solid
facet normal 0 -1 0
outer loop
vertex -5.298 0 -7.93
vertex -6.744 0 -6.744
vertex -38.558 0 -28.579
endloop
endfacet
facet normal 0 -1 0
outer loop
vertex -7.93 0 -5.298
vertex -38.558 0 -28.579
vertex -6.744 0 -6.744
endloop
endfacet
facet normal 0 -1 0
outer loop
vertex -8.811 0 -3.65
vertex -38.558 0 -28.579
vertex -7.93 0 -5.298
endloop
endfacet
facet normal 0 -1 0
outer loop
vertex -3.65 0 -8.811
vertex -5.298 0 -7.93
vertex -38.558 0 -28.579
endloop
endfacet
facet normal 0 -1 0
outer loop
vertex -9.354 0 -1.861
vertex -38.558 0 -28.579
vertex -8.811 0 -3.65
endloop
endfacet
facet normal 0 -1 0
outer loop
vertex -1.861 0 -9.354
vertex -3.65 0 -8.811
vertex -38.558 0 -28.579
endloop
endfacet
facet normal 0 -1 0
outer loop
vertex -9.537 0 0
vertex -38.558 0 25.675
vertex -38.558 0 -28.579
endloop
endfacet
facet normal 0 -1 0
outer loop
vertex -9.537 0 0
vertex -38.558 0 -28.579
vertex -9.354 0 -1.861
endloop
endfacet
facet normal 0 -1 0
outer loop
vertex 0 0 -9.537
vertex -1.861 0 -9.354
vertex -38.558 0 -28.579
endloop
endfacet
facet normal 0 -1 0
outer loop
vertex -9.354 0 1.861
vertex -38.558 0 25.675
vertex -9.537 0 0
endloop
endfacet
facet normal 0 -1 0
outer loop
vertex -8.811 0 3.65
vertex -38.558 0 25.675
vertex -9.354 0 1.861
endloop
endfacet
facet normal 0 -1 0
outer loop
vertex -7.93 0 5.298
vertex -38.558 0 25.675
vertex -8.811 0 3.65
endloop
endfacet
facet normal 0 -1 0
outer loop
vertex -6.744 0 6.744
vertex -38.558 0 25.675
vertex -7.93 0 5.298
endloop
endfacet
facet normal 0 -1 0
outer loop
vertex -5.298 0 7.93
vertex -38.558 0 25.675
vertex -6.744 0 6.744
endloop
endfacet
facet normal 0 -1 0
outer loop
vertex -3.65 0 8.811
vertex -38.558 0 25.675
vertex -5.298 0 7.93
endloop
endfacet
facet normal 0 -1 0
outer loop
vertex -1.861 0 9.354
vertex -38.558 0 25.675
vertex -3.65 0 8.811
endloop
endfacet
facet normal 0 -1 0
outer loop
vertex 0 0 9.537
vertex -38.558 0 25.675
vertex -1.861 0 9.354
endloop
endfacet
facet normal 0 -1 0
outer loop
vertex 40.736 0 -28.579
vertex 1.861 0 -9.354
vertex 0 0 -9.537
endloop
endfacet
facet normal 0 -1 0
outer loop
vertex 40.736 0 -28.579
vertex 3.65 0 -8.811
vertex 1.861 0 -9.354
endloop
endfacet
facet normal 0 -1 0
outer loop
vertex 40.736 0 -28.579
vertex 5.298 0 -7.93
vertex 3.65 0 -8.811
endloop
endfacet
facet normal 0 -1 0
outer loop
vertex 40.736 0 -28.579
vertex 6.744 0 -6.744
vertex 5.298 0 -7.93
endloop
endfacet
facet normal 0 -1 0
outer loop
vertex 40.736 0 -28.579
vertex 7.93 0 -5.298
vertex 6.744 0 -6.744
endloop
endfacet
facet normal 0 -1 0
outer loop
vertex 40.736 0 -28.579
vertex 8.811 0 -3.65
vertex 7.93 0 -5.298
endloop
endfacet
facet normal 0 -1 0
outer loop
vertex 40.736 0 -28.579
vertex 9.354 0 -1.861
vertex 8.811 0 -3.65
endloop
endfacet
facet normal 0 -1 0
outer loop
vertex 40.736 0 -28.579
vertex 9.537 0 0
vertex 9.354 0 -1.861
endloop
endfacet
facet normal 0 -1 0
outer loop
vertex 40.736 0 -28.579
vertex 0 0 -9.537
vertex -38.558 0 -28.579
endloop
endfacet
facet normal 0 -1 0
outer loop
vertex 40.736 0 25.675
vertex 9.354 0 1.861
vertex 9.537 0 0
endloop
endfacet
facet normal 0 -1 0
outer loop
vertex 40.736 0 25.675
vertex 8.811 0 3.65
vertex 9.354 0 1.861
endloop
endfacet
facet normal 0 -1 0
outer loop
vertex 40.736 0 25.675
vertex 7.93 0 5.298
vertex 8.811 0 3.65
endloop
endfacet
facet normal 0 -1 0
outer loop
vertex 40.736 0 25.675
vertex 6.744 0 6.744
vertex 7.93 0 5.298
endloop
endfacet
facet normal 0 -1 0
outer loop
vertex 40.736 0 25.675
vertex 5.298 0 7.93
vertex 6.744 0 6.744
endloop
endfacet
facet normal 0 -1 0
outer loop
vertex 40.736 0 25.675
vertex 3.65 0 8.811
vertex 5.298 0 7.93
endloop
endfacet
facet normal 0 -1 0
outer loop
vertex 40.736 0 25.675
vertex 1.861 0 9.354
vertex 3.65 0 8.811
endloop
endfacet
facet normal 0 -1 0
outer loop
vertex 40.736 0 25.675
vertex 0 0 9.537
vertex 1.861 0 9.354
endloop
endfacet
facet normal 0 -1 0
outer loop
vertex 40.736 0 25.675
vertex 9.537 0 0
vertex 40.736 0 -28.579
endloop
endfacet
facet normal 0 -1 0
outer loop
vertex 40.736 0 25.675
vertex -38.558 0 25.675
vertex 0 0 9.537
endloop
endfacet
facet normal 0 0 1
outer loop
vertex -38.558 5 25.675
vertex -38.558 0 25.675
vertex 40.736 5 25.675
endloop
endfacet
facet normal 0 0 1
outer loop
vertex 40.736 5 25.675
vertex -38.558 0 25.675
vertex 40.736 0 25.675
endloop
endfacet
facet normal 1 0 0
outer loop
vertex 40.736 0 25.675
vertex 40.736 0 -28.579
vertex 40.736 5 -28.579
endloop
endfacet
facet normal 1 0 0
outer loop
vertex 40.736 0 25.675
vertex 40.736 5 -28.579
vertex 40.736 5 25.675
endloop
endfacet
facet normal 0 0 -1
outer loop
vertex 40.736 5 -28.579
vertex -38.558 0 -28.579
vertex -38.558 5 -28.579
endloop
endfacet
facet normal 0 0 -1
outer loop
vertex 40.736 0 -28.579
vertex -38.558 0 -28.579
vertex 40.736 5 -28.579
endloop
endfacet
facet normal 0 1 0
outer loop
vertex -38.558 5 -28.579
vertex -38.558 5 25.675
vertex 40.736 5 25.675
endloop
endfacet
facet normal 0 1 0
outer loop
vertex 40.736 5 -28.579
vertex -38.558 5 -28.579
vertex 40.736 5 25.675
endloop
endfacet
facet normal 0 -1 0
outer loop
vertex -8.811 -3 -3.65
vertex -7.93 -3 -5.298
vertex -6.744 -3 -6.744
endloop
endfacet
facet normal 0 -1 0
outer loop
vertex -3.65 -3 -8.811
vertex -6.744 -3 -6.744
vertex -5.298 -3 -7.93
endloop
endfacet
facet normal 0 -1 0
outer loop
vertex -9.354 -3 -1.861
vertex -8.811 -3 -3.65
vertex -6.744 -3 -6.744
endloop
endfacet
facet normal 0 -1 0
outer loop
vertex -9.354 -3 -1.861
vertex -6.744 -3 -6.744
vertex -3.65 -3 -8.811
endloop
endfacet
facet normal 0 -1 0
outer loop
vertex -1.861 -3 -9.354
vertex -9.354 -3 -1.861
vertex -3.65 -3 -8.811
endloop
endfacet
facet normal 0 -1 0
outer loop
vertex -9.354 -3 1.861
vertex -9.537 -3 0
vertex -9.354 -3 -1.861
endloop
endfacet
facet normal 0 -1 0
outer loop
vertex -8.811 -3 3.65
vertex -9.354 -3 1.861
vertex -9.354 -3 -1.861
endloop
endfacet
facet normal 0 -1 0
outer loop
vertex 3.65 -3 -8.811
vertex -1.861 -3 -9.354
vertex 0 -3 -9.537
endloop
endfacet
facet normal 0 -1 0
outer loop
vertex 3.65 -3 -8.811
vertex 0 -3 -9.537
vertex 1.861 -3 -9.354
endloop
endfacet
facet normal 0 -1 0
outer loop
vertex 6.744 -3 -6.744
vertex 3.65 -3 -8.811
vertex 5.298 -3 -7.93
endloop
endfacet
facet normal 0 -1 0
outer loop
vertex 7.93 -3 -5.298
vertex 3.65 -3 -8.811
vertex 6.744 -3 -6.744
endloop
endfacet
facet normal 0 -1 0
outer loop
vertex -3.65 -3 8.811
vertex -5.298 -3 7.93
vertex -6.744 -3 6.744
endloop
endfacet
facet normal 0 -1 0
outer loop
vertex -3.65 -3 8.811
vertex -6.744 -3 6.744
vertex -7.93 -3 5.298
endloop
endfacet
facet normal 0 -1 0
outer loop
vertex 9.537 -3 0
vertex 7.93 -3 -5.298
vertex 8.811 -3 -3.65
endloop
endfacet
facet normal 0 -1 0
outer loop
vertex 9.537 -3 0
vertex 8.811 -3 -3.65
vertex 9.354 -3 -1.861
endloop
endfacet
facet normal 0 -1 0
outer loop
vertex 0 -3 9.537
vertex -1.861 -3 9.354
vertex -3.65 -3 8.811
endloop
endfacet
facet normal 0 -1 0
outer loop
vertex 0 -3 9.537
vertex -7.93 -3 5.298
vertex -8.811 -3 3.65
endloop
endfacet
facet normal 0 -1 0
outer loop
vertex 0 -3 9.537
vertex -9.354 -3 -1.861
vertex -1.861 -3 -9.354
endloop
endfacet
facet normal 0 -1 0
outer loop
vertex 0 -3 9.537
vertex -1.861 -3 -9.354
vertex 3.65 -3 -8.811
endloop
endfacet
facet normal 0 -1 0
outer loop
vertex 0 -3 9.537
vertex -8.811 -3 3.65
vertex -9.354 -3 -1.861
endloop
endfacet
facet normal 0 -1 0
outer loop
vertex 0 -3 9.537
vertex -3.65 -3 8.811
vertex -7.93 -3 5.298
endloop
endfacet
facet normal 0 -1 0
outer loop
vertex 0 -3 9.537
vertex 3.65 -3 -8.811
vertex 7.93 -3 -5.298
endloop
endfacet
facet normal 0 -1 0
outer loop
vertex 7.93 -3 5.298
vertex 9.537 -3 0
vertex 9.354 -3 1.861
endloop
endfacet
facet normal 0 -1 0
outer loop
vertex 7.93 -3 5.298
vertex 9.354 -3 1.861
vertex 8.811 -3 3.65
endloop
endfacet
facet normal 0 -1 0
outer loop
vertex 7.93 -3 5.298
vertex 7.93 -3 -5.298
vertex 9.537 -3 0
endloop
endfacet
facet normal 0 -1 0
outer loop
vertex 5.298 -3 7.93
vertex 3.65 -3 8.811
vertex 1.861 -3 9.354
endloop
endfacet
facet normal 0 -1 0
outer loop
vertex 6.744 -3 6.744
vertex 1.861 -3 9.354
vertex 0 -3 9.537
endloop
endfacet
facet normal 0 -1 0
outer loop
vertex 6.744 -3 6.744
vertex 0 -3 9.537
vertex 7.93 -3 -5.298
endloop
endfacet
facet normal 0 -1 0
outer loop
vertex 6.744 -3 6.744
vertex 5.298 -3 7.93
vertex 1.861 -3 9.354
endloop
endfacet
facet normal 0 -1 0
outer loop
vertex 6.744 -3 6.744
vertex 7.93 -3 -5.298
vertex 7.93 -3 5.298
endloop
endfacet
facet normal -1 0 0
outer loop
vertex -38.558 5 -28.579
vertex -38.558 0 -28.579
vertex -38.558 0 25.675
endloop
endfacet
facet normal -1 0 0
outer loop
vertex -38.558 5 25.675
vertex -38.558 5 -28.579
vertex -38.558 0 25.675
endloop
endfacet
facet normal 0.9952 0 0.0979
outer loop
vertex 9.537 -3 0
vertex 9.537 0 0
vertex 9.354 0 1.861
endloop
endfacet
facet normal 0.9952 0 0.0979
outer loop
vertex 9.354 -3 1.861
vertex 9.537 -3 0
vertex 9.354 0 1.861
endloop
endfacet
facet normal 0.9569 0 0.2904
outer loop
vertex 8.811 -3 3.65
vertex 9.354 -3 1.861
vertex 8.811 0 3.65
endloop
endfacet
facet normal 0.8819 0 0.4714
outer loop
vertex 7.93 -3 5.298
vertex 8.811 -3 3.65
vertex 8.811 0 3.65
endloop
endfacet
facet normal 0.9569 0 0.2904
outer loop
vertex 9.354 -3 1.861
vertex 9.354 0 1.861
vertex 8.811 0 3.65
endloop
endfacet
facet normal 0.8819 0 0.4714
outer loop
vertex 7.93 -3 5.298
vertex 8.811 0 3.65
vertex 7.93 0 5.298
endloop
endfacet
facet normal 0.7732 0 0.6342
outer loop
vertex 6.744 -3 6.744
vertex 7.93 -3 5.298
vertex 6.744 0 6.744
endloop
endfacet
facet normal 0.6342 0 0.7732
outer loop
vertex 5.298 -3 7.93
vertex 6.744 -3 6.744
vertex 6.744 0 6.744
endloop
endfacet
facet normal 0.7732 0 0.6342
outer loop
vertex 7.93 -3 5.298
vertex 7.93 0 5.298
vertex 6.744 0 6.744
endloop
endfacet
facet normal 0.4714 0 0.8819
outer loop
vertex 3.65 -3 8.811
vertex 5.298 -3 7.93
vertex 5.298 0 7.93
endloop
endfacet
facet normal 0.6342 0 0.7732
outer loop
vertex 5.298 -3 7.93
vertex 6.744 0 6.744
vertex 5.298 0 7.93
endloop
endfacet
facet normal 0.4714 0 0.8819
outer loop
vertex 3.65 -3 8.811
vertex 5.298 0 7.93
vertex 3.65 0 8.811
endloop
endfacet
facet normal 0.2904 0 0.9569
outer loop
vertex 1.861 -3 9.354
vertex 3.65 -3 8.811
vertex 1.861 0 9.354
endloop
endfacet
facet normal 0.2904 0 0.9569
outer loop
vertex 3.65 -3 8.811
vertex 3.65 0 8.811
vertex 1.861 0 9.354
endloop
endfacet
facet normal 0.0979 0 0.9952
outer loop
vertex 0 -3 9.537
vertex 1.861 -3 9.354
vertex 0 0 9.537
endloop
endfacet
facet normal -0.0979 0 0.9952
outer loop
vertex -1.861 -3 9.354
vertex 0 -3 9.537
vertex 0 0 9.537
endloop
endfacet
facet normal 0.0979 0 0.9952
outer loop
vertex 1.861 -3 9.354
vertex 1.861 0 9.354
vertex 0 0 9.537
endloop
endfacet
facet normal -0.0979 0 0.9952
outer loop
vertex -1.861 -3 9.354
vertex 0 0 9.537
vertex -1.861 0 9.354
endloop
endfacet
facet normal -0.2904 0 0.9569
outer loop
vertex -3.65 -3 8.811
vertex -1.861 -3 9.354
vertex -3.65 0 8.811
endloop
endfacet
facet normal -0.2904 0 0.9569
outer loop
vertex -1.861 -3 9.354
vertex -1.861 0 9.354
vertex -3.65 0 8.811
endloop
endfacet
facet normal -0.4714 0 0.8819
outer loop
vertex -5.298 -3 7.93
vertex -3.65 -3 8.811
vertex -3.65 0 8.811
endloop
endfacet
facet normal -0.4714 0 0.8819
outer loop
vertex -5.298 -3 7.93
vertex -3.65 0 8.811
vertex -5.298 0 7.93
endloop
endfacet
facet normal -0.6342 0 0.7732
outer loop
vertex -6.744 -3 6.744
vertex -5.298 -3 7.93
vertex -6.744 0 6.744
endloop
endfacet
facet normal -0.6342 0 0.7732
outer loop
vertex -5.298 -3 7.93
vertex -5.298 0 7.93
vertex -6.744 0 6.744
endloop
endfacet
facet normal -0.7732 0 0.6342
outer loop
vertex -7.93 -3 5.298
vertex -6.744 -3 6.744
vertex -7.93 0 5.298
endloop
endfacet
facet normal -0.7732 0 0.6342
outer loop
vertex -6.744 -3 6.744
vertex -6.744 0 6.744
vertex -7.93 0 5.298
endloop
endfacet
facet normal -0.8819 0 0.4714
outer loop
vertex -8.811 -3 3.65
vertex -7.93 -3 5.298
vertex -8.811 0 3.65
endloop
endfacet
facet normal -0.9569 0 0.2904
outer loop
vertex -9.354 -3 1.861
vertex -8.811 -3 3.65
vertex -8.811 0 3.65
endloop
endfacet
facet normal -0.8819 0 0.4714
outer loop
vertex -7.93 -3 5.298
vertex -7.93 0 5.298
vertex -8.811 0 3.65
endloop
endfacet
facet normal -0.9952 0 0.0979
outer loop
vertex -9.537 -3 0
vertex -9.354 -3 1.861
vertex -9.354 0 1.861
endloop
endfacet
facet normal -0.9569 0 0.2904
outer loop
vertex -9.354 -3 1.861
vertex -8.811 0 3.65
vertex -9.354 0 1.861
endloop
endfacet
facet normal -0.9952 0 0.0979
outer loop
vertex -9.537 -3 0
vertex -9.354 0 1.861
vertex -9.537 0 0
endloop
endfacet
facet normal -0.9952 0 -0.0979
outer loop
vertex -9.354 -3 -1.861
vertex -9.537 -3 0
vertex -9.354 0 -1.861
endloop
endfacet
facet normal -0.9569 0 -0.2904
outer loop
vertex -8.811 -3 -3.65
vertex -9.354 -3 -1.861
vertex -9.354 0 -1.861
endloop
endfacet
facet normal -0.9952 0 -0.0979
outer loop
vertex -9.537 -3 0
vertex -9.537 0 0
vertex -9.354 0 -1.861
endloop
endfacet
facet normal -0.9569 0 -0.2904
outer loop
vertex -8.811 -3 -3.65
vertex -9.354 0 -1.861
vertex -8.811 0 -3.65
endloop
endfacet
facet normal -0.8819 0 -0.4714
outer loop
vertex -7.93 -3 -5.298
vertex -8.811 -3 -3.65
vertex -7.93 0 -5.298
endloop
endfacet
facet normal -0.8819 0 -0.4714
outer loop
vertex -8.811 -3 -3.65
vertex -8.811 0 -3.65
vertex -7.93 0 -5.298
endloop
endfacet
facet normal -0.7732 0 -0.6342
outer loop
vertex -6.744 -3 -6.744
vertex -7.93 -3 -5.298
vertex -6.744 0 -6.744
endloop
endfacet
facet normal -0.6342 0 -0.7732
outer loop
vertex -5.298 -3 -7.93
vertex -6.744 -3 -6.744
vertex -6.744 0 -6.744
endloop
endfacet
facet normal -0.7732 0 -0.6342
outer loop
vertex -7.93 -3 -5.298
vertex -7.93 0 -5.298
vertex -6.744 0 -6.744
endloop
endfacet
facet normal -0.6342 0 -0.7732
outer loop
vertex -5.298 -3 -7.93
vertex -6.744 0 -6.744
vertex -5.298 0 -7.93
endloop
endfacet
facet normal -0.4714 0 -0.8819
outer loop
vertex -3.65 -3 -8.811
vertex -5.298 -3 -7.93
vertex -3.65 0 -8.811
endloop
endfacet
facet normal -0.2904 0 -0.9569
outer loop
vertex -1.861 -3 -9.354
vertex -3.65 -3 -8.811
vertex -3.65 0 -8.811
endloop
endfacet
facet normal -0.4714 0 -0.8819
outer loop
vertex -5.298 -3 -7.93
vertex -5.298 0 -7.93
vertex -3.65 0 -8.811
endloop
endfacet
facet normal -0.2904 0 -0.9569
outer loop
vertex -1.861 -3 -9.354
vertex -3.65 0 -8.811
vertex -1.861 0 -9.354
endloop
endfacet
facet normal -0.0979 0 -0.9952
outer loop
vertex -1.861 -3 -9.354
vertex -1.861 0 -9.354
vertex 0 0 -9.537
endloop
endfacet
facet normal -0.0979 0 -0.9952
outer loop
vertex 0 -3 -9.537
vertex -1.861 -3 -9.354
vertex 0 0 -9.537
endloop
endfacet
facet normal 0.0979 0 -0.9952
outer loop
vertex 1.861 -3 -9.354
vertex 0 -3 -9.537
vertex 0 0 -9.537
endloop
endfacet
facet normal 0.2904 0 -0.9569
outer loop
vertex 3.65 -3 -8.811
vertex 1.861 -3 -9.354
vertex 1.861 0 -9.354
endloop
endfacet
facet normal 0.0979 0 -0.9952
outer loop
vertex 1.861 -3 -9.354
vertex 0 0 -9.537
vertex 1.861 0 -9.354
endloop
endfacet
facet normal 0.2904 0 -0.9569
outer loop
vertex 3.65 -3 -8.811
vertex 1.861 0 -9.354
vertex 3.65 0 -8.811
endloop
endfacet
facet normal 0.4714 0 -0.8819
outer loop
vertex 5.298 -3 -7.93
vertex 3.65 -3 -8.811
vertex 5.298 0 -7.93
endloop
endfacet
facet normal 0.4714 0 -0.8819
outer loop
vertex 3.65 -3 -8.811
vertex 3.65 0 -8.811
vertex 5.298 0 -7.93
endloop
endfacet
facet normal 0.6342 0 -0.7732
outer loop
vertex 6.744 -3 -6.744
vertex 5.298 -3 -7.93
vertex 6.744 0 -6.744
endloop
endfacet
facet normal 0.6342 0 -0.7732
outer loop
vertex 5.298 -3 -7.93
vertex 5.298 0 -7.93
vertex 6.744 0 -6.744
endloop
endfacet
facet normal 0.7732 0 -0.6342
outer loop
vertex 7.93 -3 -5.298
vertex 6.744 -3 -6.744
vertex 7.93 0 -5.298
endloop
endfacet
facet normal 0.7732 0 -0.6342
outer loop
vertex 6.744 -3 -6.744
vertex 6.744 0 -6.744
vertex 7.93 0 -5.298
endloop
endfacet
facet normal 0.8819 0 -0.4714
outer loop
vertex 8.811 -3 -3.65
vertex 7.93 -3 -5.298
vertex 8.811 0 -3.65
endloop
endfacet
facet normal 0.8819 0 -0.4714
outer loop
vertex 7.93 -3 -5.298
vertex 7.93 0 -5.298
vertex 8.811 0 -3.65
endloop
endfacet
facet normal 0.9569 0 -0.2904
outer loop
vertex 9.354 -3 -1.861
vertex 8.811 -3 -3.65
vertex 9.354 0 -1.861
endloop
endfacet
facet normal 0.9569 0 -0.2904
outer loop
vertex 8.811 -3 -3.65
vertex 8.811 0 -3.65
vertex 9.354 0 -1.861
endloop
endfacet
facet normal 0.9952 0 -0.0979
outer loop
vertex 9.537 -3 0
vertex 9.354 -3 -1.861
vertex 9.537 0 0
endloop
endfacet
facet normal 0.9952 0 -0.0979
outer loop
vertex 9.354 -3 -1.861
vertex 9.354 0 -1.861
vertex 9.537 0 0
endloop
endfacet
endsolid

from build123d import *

# Parameters (mm, degrees)
F0_W     = 79.294
F0_H     = 54.2539670305
F1_DEPTH = 5
F2_R     = 9.5370045267
F3_DEPTH = 3


# Not quite as in the source:
# - the program builds the solid bodies; features that only make, move or delete a surface that nothing else refers to are left out


with BuildPart() as f1:
    # F0 (on Front) → F1 (new body)
    with BuildSketch(Plane.XZ):
        with Locations((1.0885317774, -1.4516480646)):
            Rectangle(F0_W, F0_H)
    extrude(amount=-F1_DEPTH)

    # F2 (on face) → F3 (join)
    with BuildSketch(Plane.XZ):
        Circle(F2_R)
    extrude(amount=F3_DEPTH)


solid = f1.part
